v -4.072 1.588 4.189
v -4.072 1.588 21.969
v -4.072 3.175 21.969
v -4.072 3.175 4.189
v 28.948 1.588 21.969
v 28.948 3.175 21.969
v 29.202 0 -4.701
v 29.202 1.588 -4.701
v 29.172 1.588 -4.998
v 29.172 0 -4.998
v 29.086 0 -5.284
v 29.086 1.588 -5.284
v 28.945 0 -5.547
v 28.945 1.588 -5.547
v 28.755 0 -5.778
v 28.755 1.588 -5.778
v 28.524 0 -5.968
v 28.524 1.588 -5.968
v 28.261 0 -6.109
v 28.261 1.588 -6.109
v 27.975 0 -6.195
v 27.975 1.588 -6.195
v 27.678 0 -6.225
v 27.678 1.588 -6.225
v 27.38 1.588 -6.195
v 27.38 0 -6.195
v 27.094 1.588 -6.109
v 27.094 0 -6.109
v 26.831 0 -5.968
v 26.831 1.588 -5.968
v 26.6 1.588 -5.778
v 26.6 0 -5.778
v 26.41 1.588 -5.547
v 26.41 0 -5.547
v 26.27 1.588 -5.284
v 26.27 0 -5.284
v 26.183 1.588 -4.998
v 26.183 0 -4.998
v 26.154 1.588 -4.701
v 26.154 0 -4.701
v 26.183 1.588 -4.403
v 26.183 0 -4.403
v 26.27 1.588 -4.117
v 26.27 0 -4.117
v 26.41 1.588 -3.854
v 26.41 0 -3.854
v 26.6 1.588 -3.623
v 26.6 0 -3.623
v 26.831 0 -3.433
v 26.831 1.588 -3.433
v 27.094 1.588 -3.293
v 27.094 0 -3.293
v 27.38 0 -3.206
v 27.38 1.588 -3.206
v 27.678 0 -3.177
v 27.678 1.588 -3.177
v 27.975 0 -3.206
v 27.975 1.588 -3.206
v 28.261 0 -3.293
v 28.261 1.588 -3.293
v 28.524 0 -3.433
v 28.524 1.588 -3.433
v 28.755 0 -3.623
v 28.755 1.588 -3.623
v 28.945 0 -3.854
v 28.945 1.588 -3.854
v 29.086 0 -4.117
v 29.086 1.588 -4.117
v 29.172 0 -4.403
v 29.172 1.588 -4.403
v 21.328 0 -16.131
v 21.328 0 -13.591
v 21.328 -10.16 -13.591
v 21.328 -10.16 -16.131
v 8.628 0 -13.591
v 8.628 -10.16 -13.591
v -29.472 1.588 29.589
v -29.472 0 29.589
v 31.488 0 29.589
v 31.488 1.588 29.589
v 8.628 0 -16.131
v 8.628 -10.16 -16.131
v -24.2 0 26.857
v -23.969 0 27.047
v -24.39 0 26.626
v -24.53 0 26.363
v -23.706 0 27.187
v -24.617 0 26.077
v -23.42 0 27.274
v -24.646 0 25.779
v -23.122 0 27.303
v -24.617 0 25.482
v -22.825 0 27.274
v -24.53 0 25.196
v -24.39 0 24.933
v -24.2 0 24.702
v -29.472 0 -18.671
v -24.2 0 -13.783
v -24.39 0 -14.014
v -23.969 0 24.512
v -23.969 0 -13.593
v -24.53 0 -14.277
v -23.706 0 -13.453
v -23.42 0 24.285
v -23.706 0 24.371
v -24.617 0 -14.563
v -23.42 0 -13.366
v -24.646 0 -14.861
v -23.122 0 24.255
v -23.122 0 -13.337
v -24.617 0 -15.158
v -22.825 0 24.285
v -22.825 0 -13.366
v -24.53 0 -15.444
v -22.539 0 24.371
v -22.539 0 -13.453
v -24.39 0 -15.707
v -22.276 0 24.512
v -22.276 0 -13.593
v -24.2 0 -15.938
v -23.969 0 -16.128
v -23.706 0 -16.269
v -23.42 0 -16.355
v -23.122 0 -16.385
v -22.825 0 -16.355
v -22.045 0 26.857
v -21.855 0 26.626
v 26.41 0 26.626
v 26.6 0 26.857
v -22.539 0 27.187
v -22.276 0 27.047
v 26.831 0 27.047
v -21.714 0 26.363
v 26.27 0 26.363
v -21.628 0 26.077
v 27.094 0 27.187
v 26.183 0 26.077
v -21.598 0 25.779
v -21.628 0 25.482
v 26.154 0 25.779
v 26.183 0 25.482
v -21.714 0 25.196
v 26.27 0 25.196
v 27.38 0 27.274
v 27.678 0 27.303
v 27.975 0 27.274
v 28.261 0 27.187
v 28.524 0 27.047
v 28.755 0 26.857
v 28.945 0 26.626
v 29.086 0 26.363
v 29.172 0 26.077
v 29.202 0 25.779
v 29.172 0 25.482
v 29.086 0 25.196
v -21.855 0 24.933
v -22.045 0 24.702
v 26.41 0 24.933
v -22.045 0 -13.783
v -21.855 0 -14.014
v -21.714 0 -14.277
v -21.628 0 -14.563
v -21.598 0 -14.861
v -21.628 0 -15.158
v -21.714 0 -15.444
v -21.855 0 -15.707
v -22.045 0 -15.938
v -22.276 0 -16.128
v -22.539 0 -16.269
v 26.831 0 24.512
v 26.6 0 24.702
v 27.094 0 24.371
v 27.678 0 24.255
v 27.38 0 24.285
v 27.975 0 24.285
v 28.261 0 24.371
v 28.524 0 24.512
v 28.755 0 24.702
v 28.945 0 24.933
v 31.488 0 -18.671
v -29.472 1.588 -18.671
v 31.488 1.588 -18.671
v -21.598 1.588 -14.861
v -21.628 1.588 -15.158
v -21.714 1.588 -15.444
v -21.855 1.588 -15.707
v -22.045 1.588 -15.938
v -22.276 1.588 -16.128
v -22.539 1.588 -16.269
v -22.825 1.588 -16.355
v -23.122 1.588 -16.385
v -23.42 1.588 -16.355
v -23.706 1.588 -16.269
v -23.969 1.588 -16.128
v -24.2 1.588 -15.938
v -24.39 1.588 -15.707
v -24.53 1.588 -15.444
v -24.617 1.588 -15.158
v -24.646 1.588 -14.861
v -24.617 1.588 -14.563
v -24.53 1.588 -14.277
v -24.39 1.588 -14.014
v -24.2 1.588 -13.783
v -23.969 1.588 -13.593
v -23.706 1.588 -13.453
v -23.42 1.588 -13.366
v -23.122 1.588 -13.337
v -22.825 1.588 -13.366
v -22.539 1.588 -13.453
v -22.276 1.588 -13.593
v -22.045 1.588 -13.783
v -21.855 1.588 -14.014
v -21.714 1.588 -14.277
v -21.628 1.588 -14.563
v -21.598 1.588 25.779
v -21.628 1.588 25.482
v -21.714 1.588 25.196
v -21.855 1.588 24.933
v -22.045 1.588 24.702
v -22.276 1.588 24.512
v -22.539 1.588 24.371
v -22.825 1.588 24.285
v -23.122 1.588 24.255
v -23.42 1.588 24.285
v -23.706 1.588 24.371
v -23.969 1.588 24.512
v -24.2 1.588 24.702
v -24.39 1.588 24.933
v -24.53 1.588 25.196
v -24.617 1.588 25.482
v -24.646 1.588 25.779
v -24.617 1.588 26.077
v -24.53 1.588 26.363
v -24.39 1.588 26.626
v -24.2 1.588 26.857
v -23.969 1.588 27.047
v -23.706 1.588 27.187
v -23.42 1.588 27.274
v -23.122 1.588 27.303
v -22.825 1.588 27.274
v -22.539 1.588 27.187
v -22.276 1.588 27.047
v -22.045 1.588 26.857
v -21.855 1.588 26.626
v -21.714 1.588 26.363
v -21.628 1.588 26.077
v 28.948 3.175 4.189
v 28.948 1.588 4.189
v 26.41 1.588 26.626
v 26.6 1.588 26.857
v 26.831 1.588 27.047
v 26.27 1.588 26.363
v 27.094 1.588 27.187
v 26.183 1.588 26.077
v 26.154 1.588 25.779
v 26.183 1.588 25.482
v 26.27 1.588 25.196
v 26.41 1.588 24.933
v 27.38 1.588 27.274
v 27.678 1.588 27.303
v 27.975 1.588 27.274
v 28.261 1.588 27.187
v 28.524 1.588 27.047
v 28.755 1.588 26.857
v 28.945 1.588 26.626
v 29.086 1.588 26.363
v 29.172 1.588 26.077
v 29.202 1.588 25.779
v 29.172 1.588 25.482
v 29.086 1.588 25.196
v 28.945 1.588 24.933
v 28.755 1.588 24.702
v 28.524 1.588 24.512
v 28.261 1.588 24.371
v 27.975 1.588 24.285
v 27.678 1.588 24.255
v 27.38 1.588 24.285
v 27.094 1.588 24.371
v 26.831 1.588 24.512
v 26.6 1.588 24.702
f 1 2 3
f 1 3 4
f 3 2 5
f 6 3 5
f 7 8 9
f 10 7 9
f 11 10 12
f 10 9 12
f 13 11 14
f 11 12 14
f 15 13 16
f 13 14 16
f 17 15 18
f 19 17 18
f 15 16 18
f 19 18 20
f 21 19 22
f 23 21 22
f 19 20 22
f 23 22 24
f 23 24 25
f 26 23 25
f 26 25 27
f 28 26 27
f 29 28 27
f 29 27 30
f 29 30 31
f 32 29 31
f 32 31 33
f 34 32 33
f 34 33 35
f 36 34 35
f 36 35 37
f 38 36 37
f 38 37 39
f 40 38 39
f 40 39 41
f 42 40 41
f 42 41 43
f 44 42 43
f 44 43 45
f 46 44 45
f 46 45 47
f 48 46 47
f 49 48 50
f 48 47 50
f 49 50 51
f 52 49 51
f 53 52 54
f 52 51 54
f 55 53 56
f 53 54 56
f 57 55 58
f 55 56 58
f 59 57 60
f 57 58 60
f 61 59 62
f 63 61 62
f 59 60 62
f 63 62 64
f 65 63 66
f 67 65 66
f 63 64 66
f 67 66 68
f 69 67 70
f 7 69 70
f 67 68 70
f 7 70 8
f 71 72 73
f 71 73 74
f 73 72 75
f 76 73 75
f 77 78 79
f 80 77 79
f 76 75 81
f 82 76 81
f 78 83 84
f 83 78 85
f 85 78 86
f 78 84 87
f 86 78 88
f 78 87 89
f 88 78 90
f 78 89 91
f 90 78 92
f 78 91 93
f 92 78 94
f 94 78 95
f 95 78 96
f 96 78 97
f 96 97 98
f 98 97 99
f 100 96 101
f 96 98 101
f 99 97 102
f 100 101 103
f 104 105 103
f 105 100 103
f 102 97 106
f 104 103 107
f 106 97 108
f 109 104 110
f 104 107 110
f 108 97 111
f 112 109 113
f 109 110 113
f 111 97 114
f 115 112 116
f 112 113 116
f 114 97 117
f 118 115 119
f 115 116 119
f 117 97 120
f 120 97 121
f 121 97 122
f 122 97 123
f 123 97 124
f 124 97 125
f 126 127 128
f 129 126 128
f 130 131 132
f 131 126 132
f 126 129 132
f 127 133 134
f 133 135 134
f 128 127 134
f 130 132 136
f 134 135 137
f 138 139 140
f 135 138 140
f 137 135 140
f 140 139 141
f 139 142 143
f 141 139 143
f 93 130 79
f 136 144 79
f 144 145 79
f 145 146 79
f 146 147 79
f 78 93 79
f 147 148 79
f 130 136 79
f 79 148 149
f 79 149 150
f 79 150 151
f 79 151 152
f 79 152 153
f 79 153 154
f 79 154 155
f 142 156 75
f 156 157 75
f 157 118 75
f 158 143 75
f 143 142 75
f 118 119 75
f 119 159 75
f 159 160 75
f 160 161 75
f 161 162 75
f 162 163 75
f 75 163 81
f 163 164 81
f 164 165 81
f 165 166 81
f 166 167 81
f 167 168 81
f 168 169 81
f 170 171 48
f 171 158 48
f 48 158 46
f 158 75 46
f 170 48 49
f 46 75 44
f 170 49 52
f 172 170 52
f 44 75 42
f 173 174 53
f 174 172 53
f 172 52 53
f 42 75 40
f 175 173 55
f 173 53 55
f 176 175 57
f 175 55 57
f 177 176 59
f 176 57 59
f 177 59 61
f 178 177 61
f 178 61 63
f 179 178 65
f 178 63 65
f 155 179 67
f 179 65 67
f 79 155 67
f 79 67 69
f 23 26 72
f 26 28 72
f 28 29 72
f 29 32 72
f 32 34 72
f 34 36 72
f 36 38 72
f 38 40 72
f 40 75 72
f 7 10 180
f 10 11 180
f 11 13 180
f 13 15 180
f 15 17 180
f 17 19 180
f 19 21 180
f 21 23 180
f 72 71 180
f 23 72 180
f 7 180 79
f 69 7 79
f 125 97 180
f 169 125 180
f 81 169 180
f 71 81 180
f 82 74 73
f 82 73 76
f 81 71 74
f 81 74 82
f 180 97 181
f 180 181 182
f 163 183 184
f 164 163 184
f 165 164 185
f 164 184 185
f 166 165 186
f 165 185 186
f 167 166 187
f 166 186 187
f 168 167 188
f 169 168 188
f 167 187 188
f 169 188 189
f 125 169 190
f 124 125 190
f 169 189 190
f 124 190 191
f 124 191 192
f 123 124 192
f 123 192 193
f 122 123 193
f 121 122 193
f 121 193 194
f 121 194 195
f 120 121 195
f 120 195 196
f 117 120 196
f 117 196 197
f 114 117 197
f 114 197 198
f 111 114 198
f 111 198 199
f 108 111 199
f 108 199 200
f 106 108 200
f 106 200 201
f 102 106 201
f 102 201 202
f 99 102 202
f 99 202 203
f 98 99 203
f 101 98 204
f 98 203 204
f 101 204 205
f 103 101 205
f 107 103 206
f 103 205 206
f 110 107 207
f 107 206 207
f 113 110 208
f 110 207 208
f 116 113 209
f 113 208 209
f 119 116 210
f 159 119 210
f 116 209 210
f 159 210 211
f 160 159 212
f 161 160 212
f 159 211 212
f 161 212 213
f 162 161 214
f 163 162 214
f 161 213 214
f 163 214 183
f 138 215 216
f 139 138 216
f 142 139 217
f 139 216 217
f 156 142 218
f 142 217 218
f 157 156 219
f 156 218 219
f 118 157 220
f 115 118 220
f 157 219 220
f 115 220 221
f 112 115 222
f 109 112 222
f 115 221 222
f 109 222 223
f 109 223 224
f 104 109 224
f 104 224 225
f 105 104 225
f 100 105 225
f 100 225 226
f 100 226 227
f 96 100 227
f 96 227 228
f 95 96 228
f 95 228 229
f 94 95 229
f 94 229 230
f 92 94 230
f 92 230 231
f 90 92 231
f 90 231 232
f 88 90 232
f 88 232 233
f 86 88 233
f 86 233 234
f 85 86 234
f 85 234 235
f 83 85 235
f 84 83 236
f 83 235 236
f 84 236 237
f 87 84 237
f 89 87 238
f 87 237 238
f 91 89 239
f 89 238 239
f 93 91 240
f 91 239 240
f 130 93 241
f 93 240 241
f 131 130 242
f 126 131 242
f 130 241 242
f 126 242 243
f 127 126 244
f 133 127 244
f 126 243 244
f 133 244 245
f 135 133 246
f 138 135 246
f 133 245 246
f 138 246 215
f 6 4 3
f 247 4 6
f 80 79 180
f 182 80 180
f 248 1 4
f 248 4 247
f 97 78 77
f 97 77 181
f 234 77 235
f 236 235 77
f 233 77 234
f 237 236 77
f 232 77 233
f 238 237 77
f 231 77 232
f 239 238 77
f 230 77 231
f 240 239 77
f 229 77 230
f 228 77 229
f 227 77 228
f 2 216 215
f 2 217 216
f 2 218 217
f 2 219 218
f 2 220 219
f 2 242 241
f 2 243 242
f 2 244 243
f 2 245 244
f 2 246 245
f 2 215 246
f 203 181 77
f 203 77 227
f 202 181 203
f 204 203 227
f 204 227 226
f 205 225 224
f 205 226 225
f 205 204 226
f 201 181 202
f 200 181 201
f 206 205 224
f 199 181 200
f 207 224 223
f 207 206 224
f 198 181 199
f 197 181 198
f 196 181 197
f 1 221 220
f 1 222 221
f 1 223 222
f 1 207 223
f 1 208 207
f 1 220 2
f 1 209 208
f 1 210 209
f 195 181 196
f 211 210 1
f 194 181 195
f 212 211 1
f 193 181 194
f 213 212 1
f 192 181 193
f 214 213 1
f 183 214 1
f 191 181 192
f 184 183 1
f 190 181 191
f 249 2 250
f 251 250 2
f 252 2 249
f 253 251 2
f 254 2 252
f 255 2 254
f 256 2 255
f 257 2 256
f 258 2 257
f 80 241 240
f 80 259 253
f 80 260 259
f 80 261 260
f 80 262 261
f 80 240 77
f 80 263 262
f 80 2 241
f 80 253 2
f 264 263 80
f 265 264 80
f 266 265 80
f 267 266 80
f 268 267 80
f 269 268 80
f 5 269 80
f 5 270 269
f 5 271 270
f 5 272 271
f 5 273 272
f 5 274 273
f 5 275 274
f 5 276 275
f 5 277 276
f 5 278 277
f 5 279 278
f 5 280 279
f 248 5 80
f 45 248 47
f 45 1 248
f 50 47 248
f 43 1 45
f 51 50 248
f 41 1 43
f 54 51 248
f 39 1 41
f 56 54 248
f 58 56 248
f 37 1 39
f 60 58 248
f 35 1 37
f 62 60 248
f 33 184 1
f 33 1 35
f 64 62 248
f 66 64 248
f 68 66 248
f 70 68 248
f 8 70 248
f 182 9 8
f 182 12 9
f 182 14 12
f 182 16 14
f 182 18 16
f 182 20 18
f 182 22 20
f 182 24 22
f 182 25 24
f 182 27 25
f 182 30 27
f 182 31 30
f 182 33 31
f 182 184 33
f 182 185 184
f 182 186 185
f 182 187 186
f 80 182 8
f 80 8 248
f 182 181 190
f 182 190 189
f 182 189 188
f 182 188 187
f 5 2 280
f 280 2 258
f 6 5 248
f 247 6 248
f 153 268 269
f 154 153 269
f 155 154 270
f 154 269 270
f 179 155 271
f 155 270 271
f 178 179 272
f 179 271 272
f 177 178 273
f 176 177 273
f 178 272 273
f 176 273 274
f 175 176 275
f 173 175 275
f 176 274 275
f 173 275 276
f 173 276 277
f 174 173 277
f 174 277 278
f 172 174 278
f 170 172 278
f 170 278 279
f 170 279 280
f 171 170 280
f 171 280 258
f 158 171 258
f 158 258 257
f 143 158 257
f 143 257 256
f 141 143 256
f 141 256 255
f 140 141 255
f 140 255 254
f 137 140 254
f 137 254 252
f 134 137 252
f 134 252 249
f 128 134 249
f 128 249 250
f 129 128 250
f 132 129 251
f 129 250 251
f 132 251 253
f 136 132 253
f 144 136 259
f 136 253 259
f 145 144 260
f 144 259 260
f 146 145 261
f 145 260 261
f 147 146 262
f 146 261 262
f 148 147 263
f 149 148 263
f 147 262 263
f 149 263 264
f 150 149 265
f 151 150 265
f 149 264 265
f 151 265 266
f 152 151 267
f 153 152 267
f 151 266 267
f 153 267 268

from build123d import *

# Parameters (mm, degrees)
SKETCH1_W           = 60.96
SKETCH1_H           = 48.26
BOSS_EXTRUDE1_DEPTH = 1.5875
SKETCH2_W           = 33.02
SKETCH2_H           = 17.78
BOSS_EXTRUDE2_DEPTH = 1.5875
SKETCH3_R           = 1.524
CUT_EXTRUDE1_DEPTH  = 2.5875
SKETCH4_W           = 12.7
SKETCH4_H           = 2.54
BOSS_EXTRUDE3_DEPTH = 10.16


with BuildPart() as part:
    # Sketch1 → Boss-Extrude1 (new body)
    with BuildSketch(Plane(origin=(0, 0, 0), x_dir=(1, 0, 0), z_dir=(0, 1, 0))):
        with Locations((1.00761446, -5.459482072)):
            Rectangle(SKETCH1_W, SKETCH1_H)
    extrude(amount=BOSS_EXTRUDE1_DEPTH)

    # Sketch2 → Boss-Extrude2 (add)
    with BuildSketch(Plane(origin=(0, 1.5875, 0), x_dir=(1, 0, 0), z_dir=(0, 1, 0))):
        with Locations((12.43761446, -13.079482072)):
            Rectangle(SKETCH2_W, SKETCH2_H)
    extrude(amount=BOSS_EXTRUDE2_DEPTH)

    # Sketch3 → Cut-Extrude1 (cut, through all)
    with BuildSketch(Plane(origin=(0, 1.5875, 0), x_dir=(1, 0, 0), z_dir=(0, 1, 0))):
        with Locations((-23.12238554, 14.860517928)):
            Circle(SKETCH3_R)
        with Locations((27.67761446, 4.700517928)):
            Circle(SKETCH3_R)
        with Locations((-23.12238554, -25.779482072)):
            Circle(SKETCH3_R)
        with Locations((27.67761446, -25.779482072)):
            Circle(SKETCH3_R)
    extrude(amount=-CUT_EXTRUDE1_DEPTH, mode=Mode.SUBTRACT)

    # Sketch4 → Boss-Extrude3 (add)
    with BuildSketch(Plane(origin=(0, 0, 0), x_dir=(-1, 0, 0), z_dir=(0, -1, 0))):
        with Locations((-14.97761446, 14.860517928)):
            Rectangle(SKETCH4_W, SKETCH4_H)
    extrude(amount=BOSS_EXTRUDE3_DEPTH)


solid = part.part
